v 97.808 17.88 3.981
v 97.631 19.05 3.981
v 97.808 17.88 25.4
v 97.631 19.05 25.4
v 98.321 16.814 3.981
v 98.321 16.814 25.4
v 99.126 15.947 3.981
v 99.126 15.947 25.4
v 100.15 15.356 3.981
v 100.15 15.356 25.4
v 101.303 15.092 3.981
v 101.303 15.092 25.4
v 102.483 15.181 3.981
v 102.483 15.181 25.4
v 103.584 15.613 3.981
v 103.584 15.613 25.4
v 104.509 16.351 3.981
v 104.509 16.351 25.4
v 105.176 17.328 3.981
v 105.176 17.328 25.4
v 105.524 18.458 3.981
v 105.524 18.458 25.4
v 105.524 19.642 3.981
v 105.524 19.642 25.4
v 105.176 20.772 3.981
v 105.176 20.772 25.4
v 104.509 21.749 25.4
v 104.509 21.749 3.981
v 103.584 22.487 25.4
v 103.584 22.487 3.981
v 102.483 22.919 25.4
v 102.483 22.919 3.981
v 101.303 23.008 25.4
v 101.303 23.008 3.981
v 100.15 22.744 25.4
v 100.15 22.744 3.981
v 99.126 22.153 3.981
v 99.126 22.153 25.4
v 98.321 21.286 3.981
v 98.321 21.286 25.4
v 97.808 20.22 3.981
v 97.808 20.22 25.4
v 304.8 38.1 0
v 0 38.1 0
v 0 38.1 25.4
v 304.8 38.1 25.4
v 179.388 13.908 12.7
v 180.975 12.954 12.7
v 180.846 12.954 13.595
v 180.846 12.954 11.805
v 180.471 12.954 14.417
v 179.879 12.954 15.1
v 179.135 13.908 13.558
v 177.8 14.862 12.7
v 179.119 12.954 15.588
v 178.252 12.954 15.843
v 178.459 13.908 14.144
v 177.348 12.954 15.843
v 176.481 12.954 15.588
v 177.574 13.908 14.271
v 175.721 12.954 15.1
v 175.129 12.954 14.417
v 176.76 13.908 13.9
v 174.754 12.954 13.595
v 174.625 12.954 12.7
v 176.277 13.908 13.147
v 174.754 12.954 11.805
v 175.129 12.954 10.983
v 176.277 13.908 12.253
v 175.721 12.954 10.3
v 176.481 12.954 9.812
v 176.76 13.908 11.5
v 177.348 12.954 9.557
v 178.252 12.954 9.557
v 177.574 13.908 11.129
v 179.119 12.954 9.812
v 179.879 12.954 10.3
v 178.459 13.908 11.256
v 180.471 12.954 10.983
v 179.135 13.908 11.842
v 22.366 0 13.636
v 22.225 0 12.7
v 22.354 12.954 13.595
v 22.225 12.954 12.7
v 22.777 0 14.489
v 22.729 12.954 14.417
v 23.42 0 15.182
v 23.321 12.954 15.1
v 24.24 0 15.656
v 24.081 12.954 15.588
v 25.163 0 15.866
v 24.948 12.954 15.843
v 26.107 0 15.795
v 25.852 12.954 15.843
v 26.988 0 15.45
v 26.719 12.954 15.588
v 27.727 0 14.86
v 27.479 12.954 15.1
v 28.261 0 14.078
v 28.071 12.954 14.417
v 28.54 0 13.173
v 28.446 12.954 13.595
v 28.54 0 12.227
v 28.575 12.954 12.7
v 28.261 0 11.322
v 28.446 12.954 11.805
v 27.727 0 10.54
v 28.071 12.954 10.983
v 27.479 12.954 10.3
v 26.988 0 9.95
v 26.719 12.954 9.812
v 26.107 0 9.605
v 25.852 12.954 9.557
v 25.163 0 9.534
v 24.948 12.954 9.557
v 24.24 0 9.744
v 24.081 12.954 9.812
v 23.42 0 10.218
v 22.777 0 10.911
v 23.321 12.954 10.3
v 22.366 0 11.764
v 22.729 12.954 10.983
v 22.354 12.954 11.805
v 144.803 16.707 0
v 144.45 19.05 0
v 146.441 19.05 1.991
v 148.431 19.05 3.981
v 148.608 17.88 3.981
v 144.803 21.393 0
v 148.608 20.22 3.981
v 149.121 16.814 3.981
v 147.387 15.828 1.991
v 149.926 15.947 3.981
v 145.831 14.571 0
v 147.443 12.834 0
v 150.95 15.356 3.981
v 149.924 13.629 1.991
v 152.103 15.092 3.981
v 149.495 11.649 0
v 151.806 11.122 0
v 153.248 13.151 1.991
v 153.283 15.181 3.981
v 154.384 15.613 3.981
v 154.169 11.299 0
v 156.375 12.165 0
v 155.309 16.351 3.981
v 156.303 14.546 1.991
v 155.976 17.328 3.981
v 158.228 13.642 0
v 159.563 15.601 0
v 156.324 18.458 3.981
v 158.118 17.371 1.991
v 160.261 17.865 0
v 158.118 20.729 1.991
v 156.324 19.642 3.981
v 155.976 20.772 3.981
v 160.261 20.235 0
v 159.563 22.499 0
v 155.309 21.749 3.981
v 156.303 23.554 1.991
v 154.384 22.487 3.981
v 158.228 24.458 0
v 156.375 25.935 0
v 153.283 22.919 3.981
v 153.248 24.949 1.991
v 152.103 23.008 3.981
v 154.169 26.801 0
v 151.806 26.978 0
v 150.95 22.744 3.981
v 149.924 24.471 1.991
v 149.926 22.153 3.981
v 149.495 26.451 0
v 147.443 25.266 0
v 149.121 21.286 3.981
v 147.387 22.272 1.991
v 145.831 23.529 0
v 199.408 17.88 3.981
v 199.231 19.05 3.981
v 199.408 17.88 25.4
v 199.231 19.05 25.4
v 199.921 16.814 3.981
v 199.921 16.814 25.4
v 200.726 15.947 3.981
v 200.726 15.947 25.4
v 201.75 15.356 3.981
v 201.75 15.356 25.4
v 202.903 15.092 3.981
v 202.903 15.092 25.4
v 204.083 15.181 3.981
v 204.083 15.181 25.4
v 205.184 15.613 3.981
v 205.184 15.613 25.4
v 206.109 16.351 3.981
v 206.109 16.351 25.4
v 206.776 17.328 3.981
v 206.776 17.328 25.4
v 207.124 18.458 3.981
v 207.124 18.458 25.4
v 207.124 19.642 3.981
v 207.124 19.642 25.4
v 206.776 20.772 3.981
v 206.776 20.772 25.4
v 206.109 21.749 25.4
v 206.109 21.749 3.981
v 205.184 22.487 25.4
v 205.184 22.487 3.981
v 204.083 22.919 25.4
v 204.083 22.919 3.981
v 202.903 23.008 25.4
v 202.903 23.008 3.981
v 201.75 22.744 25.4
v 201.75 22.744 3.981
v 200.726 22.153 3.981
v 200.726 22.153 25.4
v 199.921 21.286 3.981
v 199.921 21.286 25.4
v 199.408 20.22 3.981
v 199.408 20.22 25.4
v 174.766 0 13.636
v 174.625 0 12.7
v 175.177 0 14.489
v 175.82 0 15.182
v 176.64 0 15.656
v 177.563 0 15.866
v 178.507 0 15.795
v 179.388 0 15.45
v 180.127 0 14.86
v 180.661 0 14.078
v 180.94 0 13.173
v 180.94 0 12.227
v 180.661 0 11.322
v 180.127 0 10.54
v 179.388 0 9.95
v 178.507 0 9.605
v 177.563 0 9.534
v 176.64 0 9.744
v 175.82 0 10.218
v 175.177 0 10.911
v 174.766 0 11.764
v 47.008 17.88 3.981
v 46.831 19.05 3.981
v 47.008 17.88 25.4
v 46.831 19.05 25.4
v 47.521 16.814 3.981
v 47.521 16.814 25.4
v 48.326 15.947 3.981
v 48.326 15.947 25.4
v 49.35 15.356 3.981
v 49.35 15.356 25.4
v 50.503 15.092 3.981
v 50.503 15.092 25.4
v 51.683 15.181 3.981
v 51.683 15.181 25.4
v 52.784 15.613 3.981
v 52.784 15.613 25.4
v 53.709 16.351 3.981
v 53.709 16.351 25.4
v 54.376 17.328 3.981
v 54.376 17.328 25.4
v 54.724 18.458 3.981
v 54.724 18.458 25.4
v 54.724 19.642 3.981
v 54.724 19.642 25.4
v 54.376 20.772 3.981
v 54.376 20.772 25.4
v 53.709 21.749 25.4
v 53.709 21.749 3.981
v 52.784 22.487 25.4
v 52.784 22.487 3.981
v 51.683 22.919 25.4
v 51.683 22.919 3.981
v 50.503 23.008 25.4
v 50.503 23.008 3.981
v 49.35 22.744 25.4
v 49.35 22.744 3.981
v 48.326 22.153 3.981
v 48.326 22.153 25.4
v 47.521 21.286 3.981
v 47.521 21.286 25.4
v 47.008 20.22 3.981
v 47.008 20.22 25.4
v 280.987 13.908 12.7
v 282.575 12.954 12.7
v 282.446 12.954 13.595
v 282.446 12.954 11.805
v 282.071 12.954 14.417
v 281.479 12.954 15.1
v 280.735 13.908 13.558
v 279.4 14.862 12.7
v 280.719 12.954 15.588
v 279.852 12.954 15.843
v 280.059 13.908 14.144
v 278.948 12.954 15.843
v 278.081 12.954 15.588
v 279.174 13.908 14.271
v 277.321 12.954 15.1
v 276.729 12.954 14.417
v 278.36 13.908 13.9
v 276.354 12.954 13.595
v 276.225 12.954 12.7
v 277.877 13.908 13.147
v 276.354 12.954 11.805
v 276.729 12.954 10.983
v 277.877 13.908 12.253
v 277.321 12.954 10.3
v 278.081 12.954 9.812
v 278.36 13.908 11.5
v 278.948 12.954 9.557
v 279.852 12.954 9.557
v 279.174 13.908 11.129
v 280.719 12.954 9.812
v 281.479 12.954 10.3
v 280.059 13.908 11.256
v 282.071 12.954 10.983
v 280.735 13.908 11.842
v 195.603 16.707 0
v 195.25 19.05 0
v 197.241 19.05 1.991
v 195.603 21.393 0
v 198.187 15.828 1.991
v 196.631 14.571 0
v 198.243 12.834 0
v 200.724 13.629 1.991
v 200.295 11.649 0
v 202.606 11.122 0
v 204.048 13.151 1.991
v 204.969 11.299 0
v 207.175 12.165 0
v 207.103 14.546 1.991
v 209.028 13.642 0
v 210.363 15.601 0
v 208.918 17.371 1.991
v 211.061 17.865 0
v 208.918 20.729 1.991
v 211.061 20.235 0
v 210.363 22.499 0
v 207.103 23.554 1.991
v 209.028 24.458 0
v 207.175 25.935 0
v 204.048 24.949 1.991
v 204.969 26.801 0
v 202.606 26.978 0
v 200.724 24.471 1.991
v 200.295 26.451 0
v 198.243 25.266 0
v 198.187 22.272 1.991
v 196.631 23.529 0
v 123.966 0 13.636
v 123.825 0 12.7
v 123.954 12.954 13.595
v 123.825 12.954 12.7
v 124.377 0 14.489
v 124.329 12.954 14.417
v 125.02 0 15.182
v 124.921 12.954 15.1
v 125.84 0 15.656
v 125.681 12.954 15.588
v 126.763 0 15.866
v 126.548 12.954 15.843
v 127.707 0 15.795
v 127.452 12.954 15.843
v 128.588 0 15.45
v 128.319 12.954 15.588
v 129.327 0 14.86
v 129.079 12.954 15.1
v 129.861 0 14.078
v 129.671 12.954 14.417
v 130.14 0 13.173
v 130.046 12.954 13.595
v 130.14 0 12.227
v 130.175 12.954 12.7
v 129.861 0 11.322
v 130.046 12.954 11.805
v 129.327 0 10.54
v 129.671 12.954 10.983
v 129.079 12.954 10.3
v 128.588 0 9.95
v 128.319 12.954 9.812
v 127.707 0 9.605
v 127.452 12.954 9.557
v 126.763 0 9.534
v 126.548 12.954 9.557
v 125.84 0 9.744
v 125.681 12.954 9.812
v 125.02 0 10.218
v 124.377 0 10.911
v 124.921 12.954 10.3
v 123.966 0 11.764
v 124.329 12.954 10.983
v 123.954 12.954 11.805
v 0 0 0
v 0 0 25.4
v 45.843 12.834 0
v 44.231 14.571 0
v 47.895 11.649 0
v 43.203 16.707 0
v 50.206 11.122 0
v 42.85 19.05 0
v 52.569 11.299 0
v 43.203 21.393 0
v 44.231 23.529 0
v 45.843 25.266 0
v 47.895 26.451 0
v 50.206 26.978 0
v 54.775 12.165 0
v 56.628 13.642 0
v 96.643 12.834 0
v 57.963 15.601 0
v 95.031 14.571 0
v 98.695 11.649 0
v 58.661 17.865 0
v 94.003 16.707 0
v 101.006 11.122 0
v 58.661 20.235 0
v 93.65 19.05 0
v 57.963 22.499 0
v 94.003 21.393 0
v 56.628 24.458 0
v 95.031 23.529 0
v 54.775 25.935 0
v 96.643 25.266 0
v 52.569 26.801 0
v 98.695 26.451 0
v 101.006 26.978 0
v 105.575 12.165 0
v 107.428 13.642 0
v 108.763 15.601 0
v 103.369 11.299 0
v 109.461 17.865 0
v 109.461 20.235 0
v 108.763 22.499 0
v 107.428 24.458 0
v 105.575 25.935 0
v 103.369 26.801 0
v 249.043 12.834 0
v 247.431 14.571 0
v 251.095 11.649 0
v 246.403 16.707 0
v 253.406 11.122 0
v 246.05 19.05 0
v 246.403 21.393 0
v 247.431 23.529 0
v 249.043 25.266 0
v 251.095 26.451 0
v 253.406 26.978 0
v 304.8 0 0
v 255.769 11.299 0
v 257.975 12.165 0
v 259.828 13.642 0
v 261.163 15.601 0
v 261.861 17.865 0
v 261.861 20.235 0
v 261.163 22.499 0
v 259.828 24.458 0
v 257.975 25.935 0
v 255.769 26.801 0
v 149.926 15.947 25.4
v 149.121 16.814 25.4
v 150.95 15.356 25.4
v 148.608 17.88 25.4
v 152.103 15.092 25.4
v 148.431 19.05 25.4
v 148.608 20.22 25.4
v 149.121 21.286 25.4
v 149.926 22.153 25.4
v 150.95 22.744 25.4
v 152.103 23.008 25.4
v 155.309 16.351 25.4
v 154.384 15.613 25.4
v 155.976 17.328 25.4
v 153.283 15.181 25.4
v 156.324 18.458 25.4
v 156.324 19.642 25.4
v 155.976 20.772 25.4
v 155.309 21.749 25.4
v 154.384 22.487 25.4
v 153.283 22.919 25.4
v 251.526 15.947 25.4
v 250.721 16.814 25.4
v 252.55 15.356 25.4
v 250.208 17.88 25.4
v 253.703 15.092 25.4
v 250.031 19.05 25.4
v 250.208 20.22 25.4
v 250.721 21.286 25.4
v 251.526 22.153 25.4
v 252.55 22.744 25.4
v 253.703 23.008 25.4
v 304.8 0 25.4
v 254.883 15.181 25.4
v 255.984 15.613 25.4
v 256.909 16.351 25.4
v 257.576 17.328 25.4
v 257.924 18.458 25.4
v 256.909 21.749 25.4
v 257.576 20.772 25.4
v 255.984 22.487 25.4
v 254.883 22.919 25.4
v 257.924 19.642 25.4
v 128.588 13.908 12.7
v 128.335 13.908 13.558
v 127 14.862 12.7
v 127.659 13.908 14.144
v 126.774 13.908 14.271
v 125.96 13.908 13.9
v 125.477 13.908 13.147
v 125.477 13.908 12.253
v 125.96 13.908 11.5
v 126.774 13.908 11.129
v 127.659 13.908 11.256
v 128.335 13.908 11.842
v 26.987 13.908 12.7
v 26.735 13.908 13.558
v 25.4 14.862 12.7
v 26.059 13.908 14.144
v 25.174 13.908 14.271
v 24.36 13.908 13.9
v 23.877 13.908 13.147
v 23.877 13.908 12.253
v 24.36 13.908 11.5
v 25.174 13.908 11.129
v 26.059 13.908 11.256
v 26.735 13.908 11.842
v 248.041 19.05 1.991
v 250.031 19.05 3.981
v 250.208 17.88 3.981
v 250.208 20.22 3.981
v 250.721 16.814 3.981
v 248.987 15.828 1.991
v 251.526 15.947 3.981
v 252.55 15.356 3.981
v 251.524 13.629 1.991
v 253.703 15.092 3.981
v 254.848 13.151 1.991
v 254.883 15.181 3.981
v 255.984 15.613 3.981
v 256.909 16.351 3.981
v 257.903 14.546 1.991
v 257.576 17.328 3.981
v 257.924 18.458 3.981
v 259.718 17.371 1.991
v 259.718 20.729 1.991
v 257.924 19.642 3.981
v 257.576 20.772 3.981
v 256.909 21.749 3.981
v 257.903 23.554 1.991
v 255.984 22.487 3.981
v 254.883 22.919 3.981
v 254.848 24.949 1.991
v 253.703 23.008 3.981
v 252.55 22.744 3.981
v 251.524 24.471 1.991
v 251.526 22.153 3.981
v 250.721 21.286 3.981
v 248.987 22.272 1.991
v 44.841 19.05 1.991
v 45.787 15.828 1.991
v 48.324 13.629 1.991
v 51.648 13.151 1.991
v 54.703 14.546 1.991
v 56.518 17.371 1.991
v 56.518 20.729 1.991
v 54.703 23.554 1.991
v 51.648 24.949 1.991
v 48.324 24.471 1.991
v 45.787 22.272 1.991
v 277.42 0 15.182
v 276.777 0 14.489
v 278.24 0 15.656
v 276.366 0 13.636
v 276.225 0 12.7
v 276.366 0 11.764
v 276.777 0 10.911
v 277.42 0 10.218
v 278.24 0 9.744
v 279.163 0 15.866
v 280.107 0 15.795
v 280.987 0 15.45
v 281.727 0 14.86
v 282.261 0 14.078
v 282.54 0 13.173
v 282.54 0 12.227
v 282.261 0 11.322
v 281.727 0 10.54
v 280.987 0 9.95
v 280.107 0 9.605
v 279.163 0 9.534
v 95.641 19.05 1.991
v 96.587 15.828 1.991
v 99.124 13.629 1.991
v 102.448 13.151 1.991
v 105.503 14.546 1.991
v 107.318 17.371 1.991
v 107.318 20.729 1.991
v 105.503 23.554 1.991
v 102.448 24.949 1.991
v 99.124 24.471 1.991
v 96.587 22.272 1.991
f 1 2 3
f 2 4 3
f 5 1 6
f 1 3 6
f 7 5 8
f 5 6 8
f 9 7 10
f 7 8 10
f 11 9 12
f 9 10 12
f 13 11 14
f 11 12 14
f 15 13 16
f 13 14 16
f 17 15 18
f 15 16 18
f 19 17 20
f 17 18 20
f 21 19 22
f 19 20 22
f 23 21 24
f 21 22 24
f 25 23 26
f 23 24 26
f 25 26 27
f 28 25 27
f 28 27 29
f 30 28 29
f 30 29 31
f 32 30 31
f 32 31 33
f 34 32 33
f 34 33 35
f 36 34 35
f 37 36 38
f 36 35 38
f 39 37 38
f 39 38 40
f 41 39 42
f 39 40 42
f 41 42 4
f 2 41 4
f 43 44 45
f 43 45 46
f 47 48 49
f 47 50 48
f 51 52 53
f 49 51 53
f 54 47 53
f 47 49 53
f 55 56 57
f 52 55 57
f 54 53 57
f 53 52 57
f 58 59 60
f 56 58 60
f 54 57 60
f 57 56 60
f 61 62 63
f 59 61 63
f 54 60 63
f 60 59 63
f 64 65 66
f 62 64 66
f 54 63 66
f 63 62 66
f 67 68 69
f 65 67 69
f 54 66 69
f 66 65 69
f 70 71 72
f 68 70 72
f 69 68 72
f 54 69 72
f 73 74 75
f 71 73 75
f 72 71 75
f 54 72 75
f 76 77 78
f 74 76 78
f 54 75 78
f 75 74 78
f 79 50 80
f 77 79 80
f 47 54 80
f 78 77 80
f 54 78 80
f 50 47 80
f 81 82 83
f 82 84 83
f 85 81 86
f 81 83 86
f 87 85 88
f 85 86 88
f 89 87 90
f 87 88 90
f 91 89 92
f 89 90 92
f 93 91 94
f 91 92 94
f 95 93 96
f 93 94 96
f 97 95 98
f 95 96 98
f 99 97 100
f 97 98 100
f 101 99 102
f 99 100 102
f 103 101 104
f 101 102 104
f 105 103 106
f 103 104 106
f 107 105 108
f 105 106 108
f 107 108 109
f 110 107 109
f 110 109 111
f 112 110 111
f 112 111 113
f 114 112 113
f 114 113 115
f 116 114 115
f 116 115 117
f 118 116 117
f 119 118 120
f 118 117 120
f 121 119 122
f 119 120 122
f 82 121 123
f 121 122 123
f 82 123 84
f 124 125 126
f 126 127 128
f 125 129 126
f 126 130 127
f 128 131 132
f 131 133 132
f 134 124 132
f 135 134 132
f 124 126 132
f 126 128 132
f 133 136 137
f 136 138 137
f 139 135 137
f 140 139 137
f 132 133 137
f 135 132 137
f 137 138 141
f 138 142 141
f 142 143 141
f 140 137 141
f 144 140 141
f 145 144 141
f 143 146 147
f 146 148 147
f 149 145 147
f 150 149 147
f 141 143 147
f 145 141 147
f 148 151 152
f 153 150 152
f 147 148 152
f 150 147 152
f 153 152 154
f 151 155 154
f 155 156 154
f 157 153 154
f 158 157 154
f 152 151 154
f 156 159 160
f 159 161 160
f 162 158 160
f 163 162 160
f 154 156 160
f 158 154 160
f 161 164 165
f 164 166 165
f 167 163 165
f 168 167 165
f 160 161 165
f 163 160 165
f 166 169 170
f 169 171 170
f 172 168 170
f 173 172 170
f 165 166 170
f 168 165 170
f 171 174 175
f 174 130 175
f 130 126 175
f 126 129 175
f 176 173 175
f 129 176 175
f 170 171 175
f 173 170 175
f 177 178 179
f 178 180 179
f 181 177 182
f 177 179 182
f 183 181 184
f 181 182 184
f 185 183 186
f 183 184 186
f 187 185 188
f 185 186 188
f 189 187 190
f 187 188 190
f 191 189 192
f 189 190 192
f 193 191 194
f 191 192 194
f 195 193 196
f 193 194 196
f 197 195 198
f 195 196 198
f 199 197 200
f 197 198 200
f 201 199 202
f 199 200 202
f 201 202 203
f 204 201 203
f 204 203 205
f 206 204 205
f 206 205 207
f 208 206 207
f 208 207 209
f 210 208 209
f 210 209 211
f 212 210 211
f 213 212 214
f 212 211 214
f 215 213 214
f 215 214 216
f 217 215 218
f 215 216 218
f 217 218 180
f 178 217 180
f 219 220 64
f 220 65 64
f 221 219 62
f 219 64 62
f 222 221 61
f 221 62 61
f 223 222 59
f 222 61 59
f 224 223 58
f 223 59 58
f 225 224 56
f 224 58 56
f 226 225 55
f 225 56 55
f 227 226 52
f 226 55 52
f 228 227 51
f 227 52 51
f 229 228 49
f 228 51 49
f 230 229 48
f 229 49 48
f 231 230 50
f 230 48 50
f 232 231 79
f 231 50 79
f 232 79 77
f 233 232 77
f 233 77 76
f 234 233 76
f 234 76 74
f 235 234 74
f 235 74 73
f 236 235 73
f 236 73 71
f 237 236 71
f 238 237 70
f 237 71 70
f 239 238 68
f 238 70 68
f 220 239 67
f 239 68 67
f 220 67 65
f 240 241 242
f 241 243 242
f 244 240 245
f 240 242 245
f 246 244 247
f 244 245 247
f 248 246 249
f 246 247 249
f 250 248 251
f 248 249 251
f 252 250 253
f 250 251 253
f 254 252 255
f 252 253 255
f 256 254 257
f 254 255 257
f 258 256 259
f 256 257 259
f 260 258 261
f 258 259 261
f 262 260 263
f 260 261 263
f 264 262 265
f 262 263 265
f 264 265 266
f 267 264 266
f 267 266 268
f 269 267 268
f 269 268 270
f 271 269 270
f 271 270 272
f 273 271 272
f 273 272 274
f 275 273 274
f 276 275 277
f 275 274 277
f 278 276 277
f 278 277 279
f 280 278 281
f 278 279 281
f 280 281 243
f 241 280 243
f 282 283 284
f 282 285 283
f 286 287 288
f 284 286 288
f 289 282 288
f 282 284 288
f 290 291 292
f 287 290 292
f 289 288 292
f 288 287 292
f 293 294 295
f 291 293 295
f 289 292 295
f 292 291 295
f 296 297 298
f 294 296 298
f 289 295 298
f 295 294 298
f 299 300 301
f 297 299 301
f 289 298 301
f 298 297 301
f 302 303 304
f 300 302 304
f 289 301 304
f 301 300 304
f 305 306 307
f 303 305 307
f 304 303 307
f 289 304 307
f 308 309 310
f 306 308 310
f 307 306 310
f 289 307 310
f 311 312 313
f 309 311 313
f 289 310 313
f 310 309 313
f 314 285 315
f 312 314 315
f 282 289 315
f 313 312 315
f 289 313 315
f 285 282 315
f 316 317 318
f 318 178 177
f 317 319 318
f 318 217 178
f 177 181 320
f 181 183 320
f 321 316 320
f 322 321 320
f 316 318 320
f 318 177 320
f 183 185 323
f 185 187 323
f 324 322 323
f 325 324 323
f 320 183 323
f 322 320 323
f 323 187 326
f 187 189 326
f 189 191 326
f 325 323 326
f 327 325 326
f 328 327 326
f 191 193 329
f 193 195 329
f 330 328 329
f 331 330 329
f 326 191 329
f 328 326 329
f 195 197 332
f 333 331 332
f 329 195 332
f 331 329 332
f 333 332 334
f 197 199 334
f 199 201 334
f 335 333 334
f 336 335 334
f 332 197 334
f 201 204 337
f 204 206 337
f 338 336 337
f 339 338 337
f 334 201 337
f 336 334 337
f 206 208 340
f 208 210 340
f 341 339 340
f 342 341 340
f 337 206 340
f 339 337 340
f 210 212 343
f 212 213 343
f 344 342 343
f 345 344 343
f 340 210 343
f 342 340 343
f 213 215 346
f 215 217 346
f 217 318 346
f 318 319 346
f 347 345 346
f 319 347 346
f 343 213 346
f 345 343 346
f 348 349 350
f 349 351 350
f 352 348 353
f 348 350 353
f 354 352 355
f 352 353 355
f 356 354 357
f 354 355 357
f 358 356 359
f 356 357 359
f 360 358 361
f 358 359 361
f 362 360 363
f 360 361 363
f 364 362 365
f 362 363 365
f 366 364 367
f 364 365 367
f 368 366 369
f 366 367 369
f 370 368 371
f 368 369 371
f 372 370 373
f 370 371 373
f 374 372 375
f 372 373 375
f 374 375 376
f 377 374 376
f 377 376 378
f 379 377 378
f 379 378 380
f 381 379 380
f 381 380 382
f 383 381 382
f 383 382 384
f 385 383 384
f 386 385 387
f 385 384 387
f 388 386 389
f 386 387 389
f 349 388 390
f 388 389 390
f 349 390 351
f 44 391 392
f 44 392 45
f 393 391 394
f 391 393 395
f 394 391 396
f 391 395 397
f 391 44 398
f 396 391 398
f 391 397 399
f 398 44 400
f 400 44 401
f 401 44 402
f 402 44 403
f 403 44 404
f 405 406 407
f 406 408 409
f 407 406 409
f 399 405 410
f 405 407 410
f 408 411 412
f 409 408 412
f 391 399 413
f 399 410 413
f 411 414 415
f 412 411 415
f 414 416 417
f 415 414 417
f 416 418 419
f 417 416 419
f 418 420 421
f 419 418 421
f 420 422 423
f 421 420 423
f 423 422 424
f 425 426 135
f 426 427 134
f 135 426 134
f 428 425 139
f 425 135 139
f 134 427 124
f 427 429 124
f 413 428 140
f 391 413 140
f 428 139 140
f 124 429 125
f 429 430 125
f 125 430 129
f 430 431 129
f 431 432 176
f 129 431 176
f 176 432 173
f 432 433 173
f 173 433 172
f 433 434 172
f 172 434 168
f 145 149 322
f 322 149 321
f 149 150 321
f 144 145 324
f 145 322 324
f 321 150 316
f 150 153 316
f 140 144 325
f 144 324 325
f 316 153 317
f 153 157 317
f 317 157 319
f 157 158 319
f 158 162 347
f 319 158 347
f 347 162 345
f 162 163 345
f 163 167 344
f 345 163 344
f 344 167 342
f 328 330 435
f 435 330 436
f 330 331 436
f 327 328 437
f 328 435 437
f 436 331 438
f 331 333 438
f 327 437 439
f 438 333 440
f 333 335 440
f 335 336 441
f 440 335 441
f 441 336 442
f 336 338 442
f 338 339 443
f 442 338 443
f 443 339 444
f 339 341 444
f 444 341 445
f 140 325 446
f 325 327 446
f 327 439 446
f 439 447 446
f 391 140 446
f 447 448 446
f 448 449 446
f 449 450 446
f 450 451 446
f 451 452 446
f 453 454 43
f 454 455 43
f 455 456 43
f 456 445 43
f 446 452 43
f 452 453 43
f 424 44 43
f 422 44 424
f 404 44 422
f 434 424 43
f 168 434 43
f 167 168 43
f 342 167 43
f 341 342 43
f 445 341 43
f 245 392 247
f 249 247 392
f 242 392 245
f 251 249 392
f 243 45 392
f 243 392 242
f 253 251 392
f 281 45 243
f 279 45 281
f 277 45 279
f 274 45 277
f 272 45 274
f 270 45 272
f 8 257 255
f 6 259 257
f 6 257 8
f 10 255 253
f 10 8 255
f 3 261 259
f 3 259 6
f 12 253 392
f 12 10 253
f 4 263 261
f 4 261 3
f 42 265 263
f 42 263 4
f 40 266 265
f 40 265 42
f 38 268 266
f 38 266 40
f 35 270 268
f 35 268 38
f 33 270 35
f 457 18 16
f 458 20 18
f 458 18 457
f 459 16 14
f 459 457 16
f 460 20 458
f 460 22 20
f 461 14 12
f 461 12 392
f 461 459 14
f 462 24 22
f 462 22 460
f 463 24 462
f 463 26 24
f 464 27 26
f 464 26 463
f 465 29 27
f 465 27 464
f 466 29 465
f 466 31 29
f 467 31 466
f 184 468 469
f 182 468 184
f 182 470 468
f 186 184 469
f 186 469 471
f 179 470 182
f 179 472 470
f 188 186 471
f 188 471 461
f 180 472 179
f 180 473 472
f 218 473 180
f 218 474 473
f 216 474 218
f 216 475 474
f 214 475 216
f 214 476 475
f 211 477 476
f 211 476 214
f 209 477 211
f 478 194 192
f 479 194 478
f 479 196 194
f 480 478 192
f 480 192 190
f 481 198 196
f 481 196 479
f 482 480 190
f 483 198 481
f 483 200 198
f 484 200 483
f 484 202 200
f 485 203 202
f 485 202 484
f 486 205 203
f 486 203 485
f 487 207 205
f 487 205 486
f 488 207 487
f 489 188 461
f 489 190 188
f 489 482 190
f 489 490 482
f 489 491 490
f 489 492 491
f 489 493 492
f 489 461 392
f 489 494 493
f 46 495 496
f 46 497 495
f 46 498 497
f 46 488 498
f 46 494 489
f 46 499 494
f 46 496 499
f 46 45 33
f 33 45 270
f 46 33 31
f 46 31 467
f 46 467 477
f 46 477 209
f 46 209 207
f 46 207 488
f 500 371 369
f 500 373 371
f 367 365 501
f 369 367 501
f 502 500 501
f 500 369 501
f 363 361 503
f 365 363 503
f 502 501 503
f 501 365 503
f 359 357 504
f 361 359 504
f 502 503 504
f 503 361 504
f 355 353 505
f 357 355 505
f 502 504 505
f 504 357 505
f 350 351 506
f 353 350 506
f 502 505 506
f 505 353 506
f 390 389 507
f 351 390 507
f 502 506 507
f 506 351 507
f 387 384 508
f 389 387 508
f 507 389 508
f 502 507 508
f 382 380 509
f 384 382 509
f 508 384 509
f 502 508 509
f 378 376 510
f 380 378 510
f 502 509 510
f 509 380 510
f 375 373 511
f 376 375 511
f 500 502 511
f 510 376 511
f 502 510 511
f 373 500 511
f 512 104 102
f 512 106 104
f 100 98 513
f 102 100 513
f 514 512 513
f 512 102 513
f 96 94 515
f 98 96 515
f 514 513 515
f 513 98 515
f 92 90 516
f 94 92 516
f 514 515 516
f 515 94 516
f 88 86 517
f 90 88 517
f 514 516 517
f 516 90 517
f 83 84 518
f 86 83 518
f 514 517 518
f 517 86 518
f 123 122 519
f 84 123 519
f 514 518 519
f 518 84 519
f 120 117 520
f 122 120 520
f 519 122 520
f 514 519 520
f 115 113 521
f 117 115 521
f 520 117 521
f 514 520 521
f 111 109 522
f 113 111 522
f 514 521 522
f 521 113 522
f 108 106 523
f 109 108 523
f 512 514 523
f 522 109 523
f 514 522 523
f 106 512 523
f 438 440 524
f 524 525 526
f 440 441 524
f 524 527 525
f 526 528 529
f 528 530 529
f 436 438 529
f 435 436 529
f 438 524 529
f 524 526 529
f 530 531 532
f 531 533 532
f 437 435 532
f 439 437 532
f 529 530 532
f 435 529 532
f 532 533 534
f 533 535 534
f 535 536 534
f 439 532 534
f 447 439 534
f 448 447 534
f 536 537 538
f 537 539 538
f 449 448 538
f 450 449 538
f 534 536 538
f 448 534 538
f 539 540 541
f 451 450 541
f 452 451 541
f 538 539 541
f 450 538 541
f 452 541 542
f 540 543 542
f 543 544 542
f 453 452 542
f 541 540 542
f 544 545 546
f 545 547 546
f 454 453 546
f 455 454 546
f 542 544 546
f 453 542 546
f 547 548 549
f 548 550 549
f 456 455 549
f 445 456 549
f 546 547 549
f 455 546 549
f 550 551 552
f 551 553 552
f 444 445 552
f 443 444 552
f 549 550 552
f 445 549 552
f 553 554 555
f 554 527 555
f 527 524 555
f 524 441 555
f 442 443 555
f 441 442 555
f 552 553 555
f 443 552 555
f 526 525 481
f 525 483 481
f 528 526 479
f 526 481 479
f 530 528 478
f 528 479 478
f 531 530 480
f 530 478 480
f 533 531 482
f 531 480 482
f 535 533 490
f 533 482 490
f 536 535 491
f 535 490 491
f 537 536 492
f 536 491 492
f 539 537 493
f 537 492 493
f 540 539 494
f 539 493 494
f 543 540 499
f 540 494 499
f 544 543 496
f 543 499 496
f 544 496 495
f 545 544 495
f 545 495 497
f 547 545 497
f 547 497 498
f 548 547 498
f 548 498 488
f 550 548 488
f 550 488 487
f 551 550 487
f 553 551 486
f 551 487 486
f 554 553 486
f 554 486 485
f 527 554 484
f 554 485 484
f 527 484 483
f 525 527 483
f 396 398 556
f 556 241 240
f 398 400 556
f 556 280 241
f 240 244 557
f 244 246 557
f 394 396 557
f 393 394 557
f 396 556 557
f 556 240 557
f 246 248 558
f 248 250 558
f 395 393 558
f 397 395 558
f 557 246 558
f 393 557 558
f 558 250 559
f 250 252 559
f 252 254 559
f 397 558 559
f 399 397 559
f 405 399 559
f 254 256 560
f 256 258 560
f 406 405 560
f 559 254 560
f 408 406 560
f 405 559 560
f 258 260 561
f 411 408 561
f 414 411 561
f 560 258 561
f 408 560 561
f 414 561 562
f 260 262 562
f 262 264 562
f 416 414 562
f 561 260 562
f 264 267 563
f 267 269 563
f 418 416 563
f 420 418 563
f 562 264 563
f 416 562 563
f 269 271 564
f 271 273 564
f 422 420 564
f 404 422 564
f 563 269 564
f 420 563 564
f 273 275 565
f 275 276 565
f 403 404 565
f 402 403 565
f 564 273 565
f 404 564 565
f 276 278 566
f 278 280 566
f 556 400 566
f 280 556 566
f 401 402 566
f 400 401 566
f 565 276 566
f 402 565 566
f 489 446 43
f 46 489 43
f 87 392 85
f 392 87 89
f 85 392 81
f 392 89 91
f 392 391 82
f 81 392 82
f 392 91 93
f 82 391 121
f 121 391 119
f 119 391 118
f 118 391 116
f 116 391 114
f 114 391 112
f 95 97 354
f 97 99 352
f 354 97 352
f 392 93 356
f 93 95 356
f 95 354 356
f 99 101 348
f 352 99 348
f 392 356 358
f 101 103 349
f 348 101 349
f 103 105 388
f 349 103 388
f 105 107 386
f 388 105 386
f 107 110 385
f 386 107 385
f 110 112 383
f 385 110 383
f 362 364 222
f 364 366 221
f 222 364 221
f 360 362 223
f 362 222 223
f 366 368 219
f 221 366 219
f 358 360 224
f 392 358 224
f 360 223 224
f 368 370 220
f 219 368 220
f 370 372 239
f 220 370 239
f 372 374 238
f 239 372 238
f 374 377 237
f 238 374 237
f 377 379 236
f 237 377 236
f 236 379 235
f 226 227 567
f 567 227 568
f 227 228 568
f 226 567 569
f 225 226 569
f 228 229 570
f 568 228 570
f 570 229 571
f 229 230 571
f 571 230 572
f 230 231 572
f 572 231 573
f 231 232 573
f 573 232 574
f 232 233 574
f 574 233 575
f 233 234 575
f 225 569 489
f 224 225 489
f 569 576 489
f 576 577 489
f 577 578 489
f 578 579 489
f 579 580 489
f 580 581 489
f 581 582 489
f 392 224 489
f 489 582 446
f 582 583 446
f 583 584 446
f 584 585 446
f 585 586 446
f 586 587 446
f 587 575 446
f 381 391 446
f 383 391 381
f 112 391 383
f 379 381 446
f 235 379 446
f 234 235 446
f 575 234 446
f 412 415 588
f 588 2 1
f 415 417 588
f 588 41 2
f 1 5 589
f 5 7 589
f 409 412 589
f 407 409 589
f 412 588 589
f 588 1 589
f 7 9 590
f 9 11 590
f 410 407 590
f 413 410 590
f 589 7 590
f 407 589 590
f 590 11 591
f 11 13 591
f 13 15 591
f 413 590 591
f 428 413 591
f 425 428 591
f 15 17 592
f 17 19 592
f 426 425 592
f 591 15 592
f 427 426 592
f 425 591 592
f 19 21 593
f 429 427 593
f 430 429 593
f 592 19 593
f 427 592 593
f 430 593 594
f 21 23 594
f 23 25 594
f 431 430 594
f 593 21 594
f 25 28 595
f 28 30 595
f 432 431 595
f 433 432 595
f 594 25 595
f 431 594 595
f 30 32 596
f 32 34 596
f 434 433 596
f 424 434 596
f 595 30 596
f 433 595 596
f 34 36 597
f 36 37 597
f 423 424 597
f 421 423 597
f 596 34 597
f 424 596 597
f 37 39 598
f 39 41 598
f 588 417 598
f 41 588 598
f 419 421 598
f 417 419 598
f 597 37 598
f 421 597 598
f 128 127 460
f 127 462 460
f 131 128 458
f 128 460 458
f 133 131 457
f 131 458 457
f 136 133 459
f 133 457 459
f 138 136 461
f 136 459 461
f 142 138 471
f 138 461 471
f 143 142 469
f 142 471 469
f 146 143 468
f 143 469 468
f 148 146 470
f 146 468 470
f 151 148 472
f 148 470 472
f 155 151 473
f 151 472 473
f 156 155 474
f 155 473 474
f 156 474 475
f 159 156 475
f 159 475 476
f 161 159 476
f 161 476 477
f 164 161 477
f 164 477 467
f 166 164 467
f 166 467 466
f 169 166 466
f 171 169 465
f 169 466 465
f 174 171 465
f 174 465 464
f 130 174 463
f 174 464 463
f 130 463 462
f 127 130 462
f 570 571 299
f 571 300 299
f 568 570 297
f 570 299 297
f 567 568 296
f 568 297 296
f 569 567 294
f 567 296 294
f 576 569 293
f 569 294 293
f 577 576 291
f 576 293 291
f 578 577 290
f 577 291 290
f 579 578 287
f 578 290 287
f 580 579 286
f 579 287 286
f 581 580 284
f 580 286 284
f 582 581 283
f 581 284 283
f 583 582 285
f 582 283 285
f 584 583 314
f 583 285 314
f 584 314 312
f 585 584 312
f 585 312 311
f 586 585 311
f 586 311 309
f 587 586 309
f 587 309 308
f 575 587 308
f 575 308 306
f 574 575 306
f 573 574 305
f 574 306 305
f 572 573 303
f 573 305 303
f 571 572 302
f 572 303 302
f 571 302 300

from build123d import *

# Parameters (mm, degrees)
F0_W           = 304.8
F0_H           = 38.1
F1_DEPTH       = 25.4
F2_D           = 7.9375
F2_CSINK_D     = 15.9004
F2_CSINK_ANGLE = 90
F4_D           = 6.35
F4_DEPTH       = 12.954
F4_TIP         = 1.9077324654


with BuildPart() as f1:
    # F0 (on Top) → F1 (new body)
    with BuildSketch(Plane.XY):
        with Locations((152.4, 19.05)):
            Rectangle(F0_W, F0_H)
    extrude(amount=F1_DEPTH)

    # F2 (through all)
    with Locations(Plane(origin=(0, 0, 0), x_dir=(1, 0, 0), z_dir=(0, 0, -1))):
        with Locations((50.8, -19.05), (101.6, -19.05), (152.4, -19.05), (203.2, -19.05), (254, -19.05)):
            CounterSinkHole(F2_D / 2, F2_CSINK_D / 2, counter_sink_angle=F2_CSINK_ANGLE)

    # F4
    with Locations(Plane.XZ):
        with Locations((25.4, 12.7), (127, 12.7), (177.8, 12.7), (279.4, 12.7)):
            Hole(F4_D / 2, depth=F4_DEPTH)
            with Locations((0, 0, -(F4_DEPTH + F4_TIP / 2))):  # 118° drill point
                Cone(0, F4_D / 2, F4_TIP, mode=Mode.SUBTRACT)


solid = f1.part
